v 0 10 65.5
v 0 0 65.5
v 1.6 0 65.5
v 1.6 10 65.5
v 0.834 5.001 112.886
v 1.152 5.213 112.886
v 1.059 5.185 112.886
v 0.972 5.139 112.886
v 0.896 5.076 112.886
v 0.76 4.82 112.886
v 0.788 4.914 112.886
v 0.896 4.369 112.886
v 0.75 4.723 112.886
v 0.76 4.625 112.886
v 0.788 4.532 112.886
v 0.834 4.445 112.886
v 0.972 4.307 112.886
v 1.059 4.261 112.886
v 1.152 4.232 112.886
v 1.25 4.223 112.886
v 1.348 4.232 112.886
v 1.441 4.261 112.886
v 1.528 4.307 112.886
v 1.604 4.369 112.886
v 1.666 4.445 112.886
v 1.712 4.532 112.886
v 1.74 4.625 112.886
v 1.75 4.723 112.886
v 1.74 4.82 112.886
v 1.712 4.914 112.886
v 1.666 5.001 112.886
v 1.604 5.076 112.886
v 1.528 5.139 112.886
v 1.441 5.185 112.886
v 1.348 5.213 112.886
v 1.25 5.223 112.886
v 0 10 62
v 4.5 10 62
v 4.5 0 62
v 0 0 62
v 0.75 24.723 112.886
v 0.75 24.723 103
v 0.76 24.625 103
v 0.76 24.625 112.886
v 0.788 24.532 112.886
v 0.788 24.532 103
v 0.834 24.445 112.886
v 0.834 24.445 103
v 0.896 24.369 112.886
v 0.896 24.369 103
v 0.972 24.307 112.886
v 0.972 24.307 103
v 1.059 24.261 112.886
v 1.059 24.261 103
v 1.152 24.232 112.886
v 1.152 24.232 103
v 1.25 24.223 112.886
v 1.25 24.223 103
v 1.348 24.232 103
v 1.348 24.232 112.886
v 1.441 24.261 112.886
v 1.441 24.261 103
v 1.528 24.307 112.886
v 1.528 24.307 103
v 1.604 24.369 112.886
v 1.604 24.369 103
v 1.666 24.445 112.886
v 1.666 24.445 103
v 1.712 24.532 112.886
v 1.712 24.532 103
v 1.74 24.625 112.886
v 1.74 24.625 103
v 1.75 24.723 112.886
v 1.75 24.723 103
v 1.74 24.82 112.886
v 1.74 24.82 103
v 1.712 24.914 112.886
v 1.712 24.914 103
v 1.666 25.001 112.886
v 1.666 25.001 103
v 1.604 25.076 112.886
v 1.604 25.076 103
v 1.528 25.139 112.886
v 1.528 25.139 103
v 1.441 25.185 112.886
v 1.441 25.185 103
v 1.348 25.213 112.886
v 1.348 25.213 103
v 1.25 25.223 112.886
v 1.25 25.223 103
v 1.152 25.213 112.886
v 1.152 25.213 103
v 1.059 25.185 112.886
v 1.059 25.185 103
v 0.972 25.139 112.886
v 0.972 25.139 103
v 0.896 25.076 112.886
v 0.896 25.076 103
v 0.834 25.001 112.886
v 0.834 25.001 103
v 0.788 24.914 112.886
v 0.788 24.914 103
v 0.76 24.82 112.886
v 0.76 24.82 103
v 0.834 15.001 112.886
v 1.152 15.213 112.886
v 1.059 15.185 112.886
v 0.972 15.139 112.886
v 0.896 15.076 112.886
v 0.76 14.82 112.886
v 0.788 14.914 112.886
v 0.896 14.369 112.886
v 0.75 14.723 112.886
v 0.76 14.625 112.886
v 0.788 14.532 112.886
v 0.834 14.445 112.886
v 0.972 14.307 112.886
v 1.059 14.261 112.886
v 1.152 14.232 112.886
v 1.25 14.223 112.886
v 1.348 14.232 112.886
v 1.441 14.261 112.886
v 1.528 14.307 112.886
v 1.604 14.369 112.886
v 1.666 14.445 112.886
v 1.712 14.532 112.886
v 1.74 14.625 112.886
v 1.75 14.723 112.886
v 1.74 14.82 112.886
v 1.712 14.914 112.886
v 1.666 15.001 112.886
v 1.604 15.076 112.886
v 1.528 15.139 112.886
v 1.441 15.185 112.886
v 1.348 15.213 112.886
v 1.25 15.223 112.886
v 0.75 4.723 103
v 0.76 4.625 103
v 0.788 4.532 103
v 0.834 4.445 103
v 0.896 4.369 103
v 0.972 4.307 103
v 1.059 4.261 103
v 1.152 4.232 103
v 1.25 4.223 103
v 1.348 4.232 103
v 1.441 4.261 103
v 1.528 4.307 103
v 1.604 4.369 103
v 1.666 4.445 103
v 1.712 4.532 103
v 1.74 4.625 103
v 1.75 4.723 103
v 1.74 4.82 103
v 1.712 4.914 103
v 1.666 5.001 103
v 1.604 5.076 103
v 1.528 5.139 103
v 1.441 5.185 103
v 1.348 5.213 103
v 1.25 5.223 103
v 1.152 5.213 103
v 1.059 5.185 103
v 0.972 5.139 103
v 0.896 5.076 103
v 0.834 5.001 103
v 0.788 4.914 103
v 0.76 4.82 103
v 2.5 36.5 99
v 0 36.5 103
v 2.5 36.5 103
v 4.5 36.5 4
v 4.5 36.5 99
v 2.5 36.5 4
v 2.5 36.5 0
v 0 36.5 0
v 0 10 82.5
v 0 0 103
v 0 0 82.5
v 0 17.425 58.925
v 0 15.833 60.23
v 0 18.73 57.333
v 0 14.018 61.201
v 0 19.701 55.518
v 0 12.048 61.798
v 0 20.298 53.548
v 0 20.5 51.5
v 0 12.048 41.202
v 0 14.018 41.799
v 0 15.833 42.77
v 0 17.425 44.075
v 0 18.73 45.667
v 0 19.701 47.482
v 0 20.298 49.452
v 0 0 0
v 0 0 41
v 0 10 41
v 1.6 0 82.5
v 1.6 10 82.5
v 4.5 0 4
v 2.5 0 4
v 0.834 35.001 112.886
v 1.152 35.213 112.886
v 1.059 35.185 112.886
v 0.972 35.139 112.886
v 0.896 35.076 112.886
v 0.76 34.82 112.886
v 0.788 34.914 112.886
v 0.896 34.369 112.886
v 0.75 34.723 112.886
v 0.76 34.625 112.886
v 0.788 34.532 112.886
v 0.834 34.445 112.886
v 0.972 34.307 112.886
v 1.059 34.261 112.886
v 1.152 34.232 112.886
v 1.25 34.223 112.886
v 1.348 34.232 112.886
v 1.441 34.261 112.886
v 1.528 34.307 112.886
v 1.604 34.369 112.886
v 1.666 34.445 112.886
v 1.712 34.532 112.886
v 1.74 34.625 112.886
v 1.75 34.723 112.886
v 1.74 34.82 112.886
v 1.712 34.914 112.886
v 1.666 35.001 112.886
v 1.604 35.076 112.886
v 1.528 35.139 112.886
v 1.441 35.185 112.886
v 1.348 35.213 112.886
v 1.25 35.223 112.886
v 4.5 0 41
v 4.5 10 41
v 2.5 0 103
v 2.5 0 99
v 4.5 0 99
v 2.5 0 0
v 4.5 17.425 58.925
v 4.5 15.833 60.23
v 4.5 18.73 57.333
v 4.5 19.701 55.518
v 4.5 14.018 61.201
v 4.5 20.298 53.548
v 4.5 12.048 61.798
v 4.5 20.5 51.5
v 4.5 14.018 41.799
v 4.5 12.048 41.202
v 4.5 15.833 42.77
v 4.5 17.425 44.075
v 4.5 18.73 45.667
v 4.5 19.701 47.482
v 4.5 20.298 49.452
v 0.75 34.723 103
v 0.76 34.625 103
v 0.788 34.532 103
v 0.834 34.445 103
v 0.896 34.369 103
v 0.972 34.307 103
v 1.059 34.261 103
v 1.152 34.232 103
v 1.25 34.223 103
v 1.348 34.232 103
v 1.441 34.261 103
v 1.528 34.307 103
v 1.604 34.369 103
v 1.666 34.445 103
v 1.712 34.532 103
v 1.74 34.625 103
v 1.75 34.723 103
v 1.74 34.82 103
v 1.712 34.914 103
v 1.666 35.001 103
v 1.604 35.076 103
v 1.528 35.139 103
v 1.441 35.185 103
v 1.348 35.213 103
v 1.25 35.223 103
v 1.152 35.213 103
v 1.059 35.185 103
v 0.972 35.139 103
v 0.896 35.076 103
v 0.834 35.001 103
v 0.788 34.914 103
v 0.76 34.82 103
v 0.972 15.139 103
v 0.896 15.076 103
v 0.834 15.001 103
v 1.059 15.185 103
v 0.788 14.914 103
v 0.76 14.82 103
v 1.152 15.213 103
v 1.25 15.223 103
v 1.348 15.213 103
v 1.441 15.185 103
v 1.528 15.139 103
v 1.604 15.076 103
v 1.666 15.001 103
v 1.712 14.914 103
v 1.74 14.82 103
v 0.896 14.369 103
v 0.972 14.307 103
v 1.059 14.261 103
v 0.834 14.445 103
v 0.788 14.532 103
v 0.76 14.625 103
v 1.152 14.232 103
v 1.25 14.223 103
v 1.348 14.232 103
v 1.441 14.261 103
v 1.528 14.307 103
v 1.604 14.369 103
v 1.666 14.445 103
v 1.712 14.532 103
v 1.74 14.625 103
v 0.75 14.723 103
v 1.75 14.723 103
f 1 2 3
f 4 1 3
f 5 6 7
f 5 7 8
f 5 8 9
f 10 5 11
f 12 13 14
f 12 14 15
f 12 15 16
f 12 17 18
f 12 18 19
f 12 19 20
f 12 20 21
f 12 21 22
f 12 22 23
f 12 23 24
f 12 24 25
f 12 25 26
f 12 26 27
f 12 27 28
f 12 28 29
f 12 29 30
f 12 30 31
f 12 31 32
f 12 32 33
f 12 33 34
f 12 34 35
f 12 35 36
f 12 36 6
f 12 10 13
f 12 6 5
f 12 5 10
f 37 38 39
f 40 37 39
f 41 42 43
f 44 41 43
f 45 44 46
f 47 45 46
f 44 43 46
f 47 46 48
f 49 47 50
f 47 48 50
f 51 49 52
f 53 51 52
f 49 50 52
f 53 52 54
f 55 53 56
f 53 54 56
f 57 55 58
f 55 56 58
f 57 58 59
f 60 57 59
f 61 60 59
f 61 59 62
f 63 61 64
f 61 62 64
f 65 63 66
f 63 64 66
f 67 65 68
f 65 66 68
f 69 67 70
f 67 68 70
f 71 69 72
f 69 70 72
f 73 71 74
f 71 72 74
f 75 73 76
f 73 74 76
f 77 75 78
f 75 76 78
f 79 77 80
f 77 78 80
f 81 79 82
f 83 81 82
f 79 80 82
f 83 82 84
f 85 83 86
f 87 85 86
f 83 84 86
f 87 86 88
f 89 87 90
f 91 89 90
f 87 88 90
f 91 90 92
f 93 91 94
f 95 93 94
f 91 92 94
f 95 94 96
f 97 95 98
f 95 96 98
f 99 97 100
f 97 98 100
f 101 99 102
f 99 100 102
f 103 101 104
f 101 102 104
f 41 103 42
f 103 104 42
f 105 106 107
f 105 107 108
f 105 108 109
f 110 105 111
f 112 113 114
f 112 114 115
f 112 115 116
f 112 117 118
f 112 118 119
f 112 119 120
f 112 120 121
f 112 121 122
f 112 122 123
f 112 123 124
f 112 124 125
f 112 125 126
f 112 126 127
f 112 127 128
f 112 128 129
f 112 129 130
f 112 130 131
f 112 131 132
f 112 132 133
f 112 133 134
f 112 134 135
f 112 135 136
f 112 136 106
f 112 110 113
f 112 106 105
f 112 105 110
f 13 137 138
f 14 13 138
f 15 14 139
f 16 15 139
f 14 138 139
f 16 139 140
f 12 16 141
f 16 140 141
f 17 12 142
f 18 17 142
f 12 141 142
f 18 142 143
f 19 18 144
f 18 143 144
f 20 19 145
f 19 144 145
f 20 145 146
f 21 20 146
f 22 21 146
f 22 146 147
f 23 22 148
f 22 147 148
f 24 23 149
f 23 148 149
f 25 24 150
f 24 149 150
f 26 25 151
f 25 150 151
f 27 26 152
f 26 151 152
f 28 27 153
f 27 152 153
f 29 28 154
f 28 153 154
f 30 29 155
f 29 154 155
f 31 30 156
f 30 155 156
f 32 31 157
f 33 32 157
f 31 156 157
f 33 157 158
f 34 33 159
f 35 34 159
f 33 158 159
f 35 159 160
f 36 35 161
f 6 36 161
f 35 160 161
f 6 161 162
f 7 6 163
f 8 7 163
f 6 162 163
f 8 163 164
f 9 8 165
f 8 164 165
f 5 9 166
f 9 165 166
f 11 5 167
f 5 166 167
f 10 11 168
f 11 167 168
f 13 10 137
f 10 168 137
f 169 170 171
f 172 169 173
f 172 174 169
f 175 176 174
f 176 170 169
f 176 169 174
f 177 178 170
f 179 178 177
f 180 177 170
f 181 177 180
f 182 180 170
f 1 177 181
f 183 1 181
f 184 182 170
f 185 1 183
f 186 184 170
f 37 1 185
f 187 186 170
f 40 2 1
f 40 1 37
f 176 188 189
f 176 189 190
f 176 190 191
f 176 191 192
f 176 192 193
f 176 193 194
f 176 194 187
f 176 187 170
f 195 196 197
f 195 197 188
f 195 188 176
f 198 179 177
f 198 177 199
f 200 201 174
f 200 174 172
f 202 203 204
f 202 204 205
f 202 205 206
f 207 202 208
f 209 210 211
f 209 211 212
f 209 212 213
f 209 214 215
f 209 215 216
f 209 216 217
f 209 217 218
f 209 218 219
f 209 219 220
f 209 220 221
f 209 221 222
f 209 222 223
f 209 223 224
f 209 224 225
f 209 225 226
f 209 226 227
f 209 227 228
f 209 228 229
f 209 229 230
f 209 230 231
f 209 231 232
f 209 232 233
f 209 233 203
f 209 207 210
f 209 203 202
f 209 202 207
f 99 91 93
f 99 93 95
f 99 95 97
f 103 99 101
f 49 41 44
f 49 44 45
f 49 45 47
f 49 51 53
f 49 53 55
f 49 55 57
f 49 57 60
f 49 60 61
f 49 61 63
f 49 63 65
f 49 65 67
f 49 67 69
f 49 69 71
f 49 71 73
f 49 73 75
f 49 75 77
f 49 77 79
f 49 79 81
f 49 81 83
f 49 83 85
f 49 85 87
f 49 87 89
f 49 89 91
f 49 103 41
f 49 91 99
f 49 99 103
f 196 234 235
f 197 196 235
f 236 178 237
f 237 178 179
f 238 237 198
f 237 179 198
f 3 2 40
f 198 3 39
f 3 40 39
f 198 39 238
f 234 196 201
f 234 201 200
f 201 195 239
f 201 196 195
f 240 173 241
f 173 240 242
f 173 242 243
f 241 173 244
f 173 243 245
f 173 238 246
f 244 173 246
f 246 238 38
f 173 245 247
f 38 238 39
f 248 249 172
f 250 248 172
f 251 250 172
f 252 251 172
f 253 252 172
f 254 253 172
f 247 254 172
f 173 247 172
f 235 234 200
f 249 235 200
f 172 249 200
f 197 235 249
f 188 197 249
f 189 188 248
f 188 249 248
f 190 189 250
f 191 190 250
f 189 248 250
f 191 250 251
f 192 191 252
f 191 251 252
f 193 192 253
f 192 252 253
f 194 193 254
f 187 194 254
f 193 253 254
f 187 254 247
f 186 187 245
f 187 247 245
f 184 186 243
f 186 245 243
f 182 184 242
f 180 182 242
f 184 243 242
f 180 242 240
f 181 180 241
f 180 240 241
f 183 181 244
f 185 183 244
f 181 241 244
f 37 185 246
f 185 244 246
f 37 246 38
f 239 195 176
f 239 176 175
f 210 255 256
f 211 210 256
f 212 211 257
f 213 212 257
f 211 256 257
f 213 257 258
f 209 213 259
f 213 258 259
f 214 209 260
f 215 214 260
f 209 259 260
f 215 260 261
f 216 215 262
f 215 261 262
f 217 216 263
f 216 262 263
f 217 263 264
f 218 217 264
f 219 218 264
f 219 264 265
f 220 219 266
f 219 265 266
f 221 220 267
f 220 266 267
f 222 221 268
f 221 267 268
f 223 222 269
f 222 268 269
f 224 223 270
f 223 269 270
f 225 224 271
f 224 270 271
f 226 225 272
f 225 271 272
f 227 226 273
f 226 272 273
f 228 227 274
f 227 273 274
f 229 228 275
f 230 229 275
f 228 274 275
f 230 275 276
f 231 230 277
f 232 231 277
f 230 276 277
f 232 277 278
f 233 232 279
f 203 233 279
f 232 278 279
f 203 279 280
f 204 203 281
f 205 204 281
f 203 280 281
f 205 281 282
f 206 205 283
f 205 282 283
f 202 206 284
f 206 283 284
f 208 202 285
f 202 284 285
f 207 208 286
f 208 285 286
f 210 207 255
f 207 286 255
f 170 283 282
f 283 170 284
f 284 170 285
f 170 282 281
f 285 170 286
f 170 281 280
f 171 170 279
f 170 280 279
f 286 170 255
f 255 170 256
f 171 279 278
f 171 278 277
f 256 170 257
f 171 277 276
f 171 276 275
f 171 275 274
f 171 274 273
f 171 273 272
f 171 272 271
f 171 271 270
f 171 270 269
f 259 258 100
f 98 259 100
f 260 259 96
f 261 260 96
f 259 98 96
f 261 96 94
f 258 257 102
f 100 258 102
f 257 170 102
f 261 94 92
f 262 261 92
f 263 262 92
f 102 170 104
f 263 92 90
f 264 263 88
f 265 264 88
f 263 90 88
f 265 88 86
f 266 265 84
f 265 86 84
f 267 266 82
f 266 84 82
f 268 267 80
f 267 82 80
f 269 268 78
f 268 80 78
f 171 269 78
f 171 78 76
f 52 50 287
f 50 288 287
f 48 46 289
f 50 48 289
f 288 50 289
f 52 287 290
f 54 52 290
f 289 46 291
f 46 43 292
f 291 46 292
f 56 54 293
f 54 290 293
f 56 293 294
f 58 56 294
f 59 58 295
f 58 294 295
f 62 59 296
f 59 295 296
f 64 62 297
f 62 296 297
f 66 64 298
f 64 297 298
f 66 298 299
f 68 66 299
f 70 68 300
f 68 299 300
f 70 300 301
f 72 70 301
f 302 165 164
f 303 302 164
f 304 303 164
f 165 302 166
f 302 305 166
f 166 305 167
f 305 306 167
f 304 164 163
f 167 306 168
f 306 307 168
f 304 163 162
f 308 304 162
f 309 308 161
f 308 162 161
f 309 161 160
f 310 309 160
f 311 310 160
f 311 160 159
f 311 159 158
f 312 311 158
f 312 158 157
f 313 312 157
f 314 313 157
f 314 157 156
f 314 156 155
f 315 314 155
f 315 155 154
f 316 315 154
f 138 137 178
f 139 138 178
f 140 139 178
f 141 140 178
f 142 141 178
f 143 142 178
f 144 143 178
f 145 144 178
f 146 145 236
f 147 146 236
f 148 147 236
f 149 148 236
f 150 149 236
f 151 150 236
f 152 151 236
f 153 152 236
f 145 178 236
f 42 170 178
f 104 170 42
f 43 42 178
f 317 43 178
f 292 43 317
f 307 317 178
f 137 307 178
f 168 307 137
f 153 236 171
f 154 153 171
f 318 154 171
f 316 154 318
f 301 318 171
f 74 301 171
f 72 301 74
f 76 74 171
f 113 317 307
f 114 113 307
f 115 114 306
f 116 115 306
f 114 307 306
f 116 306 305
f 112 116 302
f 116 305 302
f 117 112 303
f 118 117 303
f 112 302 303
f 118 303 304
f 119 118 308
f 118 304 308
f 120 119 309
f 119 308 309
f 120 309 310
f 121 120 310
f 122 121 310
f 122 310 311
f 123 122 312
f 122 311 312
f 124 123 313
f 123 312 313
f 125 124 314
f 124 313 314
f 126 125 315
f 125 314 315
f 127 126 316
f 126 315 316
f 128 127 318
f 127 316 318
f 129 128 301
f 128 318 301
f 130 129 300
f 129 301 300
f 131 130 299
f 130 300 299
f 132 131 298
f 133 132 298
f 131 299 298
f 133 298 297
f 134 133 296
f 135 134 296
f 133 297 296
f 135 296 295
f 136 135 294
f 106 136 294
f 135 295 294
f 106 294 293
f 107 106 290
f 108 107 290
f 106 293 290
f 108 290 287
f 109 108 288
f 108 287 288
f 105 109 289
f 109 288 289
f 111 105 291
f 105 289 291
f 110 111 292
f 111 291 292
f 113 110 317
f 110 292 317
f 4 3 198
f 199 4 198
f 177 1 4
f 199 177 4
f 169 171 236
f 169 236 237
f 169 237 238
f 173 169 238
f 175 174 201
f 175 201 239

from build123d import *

# Parameters (mm, degrees)
SKETCH_1_W          = 2.5
SKETCH_1_H          = 103
SKETCH_1_W_2        = 2
SKETCH_1_H_2        = 95
EXTRUDE_1_DEPTH     = 99.5
CUT_EXTRUDE_2_DEPTH = 4.5
CUT_EXTRUDE_3_DEPTH = 58.5
CUT_EXTRUDE_4_DEPTH = 4.5
SKETCH_6_W          = 1.6
SKETCH_6_H          = 17
CUT_EXTRUDE_5_DEPTH = 10
SKETCH_7_R          = 0.5
EXTRUDE_2_DEPTH     = 9.886463591


with BuildPart() as part:
    # 스케치1 → 보스-돌출1 (new body)
    with BuildSketch(Plane(origin=(0, 0, 0), x_dir=(1, 0, 0), z_dir=(0, 1, 0))):
        with Locations((1.25, -51.5)):
            Rectangle(SKETCH_1_W, SKETCH_1_H)
        with Locations((3.5, -51.5)):
            Rectangle(SKETCH_1_W_2, SKETCH_1_H_2)
    extrude(amount=EXTRUDE_1_DEPTH)

    # 스케치2 → 컷-돌출2 (cut)
    with BuildSketch(Plane(origin=(4.5, 0, 0), x_dir=(0, 0, -1), z_dir=(1, 0, 0))):
        with BuildLine():
            Line((-62, 10), (-62, 0))
            Line((-62, 0), (-41, 0))
            Line((-41, 0), (-41, 10))
            ThreePointArc((-41, 10), (-51.5, 20.5), (-62, 10))
        make_face()
    extrude(amount=-CUT_EXTRUDE_2_DEPTH, mode=Mode.SUBTRACT)

    # 스케치3 → 컷-돌출3 (cut)
    with BuildSketch(Plane(origin=(0, 99.5, 0), x_dir=(1, 0, 0), z_dir=(0, 1, 0))):
        Polygon((2.5, -4), (2.5, 0), (0, 0), (0, -103), (2.5, -103), (2.5, -99), (4.5, -99), (4.5, -4), align=None)
    extrude(amount=-CUT_EXTRUDE_3_DEPTH, mode=Mode.SUBTRACT)

    # 스케치4 → 컷-돌출4 (cut)
    with BuildSketch(Plane(origin=(0, 41, 0), x_dir=(1, 0, 0), z_dir=(0, 1, 0))):
        Polygon((4.5, -4), (2.5, -4), (2.5, 0), (0, 0), (0, -103), (2.5, -103), (2.5, -99), (4.5, -99), align=None)
    extrude(amount=-CUT_EXTRUDE_4_DEPTH, mode=Mode.SUBTRACT)

    # 스케치6 → 컷-돌출5 (cut)
    with BuildSketch(Plane.XZ):
        with Locations((0.8, 74)):
            Rectangle(SKETCH_6_W, SKETCH_6_H)
    extrude(amount=-CUT_EXTRUDE_5_DEPTH, mode=Mode.SUBTRACT)

    # 스케치7 → 보스-돌출2 (add)
    with BuildSketch(Plane.XY.offset(103)):
        with Locations(Location((1.25, 34.722848579, 0), (0, 0, 180))):
            Circle(SKETCH_7_R)
        with Locations(Location((1.25, 24.722848579, 0), (0, 0, 180))):
            Circle(SKETCH_7_R)
        with Locations(Location((1.25, 14.722848579, 0), (0, 0, 180))):
            Circle(SKETCH_7_R)
        with Locations(Location((1.25, 4.722848579, 0), (0, 0, 180))):
            Circle(SKETCH_7_R)
    extrude(amount=EXTRUDE_2_DEPTH)


solid = part.part
